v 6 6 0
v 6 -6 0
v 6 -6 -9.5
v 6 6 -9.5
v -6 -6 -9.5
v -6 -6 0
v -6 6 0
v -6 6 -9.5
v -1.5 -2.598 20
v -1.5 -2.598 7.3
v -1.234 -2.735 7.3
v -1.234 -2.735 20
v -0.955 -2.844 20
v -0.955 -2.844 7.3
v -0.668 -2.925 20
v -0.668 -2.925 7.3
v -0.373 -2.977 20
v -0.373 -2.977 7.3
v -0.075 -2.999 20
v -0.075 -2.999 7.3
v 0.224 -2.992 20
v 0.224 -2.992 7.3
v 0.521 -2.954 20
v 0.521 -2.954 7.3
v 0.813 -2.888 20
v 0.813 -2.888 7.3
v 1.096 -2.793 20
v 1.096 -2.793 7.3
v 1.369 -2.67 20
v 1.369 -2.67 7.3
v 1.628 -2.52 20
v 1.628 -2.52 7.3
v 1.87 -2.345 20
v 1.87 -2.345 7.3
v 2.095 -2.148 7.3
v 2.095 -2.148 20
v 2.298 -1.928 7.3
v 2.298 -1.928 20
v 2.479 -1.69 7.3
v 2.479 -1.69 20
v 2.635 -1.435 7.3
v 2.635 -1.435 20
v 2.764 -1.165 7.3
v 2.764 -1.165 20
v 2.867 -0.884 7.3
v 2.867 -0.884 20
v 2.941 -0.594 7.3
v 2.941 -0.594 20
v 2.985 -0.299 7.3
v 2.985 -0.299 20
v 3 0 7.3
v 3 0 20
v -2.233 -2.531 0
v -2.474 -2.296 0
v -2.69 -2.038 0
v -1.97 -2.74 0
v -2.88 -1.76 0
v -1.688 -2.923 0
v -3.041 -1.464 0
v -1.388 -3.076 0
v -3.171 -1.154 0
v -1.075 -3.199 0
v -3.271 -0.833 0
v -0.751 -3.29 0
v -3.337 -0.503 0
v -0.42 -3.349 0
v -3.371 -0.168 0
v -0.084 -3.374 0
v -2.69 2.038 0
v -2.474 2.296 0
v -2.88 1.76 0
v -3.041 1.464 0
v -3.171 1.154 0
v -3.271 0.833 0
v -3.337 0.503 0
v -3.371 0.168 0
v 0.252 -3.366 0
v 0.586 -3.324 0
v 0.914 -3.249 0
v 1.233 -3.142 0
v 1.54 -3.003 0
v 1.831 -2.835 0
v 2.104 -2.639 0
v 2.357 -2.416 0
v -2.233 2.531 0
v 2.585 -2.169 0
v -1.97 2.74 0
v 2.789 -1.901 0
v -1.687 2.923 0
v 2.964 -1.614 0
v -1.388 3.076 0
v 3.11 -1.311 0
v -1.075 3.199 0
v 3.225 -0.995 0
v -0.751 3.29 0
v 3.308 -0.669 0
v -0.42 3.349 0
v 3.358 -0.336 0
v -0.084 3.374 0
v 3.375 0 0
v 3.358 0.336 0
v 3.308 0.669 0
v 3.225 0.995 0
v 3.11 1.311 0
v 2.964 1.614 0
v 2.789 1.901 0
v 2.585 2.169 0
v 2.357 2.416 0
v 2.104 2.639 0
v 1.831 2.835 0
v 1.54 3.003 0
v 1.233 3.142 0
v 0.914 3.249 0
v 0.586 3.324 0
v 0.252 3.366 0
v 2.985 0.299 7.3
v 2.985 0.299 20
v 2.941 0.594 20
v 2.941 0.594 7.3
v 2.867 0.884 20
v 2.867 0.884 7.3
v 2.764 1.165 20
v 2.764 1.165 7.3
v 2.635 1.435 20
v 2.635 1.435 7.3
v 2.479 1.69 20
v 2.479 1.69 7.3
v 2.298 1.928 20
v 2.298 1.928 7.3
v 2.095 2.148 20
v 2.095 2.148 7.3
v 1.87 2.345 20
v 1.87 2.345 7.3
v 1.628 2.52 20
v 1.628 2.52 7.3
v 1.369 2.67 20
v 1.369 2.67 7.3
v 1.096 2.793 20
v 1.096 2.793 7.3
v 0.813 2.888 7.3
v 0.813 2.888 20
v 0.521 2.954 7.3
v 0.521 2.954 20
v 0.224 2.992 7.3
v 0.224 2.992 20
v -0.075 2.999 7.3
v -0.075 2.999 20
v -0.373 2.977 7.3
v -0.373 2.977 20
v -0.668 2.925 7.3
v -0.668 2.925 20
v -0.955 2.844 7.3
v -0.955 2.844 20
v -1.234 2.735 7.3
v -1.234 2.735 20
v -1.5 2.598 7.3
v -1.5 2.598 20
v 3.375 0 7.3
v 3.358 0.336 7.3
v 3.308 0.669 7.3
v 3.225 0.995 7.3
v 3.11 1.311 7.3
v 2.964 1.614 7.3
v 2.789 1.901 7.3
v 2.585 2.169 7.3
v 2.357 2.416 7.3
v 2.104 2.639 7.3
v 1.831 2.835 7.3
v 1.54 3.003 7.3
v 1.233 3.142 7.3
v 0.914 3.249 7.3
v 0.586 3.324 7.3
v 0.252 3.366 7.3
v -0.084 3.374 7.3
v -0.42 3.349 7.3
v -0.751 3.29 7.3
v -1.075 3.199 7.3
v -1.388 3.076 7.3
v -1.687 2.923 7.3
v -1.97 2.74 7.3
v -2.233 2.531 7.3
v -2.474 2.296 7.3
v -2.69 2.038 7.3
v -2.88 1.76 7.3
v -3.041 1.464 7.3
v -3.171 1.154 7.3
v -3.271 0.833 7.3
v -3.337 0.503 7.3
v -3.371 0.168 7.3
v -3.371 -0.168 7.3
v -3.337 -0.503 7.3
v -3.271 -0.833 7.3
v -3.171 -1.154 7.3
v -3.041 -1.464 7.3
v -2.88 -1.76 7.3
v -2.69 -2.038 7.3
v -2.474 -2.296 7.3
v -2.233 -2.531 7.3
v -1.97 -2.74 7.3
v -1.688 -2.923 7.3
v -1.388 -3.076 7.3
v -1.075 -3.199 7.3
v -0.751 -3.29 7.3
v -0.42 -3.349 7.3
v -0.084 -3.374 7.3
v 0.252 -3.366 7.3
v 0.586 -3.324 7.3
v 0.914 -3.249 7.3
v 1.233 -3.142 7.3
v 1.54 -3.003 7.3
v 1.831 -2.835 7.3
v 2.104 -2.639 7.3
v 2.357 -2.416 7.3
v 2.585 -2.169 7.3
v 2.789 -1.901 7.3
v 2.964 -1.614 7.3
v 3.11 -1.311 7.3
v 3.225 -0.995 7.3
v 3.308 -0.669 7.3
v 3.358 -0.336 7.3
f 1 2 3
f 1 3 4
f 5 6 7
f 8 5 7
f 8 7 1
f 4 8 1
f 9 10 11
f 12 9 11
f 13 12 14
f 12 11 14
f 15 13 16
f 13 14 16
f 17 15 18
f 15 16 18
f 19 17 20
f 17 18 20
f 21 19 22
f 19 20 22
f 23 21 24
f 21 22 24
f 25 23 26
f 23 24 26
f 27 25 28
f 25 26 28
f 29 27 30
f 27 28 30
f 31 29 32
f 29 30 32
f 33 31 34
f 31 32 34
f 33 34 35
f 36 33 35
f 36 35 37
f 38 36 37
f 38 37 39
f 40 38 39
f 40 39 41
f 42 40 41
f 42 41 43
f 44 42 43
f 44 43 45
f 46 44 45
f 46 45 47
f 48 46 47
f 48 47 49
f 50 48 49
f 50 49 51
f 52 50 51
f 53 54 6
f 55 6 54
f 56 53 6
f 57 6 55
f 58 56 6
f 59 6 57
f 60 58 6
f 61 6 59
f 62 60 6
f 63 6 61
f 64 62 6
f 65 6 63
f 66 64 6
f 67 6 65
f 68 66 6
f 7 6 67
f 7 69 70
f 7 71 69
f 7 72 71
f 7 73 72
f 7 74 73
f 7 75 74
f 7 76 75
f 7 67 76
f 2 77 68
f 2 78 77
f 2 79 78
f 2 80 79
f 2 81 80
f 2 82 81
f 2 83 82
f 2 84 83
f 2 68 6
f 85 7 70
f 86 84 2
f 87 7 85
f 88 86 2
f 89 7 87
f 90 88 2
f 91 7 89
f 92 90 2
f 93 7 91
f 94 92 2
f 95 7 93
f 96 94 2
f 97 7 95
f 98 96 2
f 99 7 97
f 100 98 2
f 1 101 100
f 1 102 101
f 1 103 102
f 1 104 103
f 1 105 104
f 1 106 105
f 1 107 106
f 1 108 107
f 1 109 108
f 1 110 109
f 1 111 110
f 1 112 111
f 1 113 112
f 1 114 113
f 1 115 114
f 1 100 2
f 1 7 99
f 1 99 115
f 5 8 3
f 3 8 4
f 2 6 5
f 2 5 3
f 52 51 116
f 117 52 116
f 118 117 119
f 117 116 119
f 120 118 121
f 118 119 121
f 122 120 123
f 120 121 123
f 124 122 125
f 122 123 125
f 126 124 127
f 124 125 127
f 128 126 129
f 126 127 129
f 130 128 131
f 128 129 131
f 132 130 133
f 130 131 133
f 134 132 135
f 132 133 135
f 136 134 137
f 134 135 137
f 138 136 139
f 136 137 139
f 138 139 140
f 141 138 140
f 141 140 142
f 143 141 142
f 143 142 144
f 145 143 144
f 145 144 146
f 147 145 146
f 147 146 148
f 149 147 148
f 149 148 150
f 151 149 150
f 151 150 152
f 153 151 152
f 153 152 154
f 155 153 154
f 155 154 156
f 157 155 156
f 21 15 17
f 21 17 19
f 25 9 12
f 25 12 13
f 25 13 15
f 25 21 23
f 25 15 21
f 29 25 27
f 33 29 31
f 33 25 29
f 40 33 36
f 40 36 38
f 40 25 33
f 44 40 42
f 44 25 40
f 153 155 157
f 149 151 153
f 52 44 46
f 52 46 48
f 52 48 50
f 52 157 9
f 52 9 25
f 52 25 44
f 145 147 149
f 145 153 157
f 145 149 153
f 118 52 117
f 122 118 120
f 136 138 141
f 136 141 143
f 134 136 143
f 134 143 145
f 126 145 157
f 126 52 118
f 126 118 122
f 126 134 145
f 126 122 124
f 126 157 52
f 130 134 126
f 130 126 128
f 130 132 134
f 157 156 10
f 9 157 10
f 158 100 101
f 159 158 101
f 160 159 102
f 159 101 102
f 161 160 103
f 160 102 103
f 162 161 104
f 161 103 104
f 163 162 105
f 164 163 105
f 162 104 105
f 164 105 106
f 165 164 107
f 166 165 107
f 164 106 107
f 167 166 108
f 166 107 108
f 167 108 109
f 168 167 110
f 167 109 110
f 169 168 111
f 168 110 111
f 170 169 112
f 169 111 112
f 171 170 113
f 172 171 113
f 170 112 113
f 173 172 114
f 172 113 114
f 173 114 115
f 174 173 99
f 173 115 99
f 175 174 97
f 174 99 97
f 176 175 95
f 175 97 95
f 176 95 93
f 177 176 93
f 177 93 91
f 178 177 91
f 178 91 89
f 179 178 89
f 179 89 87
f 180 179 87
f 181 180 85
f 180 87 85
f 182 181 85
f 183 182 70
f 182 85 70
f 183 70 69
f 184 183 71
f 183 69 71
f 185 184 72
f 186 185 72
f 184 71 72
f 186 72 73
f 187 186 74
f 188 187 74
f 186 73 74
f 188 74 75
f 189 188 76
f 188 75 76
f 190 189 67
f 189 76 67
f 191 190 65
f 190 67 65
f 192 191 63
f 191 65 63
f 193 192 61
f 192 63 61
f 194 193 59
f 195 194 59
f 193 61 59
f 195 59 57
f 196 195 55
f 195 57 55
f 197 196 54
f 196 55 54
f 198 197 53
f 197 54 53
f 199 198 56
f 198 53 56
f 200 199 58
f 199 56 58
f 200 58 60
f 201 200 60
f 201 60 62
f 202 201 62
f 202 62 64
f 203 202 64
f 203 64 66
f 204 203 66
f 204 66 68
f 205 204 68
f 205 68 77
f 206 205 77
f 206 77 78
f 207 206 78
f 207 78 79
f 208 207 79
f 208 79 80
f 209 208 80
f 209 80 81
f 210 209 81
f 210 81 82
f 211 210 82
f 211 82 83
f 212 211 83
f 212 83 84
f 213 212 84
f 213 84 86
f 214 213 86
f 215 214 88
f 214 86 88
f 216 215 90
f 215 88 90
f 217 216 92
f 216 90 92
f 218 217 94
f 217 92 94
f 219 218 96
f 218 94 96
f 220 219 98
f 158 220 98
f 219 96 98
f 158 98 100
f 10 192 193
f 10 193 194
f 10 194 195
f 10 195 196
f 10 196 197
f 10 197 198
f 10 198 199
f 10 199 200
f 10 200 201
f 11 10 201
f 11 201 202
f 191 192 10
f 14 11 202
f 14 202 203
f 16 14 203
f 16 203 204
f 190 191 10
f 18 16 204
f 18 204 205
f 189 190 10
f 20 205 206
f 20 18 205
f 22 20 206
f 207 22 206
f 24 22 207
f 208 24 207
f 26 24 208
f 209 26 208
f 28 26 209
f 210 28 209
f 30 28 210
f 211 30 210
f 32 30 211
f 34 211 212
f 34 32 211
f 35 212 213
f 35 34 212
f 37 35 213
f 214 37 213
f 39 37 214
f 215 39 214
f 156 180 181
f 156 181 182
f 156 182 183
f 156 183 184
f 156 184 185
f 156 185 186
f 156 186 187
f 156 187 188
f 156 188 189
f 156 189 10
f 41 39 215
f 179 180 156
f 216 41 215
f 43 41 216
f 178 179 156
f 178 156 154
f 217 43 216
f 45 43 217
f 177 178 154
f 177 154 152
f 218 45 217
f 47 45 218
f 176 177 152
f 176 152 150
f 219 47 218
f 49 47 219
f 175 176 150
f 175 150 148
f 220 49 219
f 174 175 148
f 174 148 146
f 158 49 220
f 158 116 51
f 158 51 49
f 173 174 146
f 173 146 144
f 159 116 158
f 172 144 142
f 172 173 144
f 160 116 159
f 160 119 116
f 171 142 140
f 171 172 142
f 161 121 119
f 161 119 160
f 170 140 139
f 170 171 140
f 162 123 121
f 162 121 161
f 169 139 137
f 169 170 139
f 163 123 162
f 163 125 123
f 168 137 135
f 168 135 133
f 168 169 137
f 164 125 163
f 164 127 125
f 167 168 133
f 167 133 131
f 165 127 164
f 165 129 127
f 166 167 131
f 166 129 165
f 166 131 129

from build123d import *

# Parameters (mm, degrees)
F0_W     = 12
F0_H     = 12
F0_R     = 3.375
F1_DEPTH = 9.5
F2_DEPTH = 7.3
F3_DEPTH = 20


with BuildPart() as f1:
    # F0 (on Top) → F1 (new body)
    with BuildSketch(Plane.XY):
        Rectangle(F0_W, F0_H)
        Circle(F0_R, mode=Mode.SUBTRACT)
        Circle(F0_R)
        with BuildLine():
            ThreePointArc((-1.5, 2.5980762114), (1.5, 2.5980762114), (3, 0))
            ThreePointArc((3, 0), (1.5, -2.5980762114), (-1.5, -2.5980762114))
            ThreePointArc((-1.5, -2.5980762114), (-3, 0), (-1.5, 2.5980762114))
        make_face(mode=Mode.SUBTRACT)
        with BuildLine():
            ThreePointArc((-1.5, -2.5980762114), (1.5, -2.5980762114), (3, 0))
            ThreePointArc((3, 0), (1.5, 2.5980762114), (-1.5, 2.5980762114))
            Line((-1.5, 2.5980762114), (-1.5, -2.5980762114))
        make_face()
        with BuildLine():
            Line((-1.5, -2.5980762114), (-1.5, 2.5980762114))
            ThreePointArc((-1.5, 2.5980762114), (-3, 0), (-1.5, -2.5980762114))
        make_face()
    extrude(amount=-F1_DEPTH)

    # F0 (on Top) → F2 (join)
    with BuildSketch(Plane.XY):
        Circle(F0_R)
        with BuildLine():
            ThreePointArc((-1.5, 2.5980762114), (1.5, 2.5980762114), (3, 0))
            ThreePointArc((3, 0), (1.5, -2.5980762114), (-1.5, -2.5980762114))
            ThreePointArc((-1.5, -2.5980762114), (-3, 0), (-1.5, 2.5980762114))
        make_face(mode=Mode.SUBTRACT)
        with BuildLine():
            ThreePointArc((-1.5, -2.5980762114), (1.5, -2.5980762114), (3, 0))
            ThreePointArc((3, 0), (1.5, 2.5980762114), (-1.5, 2.5980762114))
            Line((-1.5, 2.5980762114), (-1.5, -2.5980762114))
        make_face()
        with BuildLine():
            Line((-1.5, -2.5980762114), (-1.5, 2.5980762114))
            ThreePointArc((-1.5, 2.5980762114), (-3, 0), (-1.5, -2.5980762114))
        make_face()
    extrude(amount=F2_DEPTH)

    # F0 (on Top) → F3 (join)
    with BuildSketch(Plane.XY):
        with BuildLine():
            ThreePointArc((-1.5, -2.5980762114), (1.5, -2.5980762114), (3, 0))
            ThreePointArc((3, 0), (1.5, 2.5980762114), (-1.5, 2.5980762114))
            Line((-1.5, 2.5980762114), (-1.5, -2.5980762114))
        make_face()
    extrude(amount=F3_DEPTH)


solid = f1.part
